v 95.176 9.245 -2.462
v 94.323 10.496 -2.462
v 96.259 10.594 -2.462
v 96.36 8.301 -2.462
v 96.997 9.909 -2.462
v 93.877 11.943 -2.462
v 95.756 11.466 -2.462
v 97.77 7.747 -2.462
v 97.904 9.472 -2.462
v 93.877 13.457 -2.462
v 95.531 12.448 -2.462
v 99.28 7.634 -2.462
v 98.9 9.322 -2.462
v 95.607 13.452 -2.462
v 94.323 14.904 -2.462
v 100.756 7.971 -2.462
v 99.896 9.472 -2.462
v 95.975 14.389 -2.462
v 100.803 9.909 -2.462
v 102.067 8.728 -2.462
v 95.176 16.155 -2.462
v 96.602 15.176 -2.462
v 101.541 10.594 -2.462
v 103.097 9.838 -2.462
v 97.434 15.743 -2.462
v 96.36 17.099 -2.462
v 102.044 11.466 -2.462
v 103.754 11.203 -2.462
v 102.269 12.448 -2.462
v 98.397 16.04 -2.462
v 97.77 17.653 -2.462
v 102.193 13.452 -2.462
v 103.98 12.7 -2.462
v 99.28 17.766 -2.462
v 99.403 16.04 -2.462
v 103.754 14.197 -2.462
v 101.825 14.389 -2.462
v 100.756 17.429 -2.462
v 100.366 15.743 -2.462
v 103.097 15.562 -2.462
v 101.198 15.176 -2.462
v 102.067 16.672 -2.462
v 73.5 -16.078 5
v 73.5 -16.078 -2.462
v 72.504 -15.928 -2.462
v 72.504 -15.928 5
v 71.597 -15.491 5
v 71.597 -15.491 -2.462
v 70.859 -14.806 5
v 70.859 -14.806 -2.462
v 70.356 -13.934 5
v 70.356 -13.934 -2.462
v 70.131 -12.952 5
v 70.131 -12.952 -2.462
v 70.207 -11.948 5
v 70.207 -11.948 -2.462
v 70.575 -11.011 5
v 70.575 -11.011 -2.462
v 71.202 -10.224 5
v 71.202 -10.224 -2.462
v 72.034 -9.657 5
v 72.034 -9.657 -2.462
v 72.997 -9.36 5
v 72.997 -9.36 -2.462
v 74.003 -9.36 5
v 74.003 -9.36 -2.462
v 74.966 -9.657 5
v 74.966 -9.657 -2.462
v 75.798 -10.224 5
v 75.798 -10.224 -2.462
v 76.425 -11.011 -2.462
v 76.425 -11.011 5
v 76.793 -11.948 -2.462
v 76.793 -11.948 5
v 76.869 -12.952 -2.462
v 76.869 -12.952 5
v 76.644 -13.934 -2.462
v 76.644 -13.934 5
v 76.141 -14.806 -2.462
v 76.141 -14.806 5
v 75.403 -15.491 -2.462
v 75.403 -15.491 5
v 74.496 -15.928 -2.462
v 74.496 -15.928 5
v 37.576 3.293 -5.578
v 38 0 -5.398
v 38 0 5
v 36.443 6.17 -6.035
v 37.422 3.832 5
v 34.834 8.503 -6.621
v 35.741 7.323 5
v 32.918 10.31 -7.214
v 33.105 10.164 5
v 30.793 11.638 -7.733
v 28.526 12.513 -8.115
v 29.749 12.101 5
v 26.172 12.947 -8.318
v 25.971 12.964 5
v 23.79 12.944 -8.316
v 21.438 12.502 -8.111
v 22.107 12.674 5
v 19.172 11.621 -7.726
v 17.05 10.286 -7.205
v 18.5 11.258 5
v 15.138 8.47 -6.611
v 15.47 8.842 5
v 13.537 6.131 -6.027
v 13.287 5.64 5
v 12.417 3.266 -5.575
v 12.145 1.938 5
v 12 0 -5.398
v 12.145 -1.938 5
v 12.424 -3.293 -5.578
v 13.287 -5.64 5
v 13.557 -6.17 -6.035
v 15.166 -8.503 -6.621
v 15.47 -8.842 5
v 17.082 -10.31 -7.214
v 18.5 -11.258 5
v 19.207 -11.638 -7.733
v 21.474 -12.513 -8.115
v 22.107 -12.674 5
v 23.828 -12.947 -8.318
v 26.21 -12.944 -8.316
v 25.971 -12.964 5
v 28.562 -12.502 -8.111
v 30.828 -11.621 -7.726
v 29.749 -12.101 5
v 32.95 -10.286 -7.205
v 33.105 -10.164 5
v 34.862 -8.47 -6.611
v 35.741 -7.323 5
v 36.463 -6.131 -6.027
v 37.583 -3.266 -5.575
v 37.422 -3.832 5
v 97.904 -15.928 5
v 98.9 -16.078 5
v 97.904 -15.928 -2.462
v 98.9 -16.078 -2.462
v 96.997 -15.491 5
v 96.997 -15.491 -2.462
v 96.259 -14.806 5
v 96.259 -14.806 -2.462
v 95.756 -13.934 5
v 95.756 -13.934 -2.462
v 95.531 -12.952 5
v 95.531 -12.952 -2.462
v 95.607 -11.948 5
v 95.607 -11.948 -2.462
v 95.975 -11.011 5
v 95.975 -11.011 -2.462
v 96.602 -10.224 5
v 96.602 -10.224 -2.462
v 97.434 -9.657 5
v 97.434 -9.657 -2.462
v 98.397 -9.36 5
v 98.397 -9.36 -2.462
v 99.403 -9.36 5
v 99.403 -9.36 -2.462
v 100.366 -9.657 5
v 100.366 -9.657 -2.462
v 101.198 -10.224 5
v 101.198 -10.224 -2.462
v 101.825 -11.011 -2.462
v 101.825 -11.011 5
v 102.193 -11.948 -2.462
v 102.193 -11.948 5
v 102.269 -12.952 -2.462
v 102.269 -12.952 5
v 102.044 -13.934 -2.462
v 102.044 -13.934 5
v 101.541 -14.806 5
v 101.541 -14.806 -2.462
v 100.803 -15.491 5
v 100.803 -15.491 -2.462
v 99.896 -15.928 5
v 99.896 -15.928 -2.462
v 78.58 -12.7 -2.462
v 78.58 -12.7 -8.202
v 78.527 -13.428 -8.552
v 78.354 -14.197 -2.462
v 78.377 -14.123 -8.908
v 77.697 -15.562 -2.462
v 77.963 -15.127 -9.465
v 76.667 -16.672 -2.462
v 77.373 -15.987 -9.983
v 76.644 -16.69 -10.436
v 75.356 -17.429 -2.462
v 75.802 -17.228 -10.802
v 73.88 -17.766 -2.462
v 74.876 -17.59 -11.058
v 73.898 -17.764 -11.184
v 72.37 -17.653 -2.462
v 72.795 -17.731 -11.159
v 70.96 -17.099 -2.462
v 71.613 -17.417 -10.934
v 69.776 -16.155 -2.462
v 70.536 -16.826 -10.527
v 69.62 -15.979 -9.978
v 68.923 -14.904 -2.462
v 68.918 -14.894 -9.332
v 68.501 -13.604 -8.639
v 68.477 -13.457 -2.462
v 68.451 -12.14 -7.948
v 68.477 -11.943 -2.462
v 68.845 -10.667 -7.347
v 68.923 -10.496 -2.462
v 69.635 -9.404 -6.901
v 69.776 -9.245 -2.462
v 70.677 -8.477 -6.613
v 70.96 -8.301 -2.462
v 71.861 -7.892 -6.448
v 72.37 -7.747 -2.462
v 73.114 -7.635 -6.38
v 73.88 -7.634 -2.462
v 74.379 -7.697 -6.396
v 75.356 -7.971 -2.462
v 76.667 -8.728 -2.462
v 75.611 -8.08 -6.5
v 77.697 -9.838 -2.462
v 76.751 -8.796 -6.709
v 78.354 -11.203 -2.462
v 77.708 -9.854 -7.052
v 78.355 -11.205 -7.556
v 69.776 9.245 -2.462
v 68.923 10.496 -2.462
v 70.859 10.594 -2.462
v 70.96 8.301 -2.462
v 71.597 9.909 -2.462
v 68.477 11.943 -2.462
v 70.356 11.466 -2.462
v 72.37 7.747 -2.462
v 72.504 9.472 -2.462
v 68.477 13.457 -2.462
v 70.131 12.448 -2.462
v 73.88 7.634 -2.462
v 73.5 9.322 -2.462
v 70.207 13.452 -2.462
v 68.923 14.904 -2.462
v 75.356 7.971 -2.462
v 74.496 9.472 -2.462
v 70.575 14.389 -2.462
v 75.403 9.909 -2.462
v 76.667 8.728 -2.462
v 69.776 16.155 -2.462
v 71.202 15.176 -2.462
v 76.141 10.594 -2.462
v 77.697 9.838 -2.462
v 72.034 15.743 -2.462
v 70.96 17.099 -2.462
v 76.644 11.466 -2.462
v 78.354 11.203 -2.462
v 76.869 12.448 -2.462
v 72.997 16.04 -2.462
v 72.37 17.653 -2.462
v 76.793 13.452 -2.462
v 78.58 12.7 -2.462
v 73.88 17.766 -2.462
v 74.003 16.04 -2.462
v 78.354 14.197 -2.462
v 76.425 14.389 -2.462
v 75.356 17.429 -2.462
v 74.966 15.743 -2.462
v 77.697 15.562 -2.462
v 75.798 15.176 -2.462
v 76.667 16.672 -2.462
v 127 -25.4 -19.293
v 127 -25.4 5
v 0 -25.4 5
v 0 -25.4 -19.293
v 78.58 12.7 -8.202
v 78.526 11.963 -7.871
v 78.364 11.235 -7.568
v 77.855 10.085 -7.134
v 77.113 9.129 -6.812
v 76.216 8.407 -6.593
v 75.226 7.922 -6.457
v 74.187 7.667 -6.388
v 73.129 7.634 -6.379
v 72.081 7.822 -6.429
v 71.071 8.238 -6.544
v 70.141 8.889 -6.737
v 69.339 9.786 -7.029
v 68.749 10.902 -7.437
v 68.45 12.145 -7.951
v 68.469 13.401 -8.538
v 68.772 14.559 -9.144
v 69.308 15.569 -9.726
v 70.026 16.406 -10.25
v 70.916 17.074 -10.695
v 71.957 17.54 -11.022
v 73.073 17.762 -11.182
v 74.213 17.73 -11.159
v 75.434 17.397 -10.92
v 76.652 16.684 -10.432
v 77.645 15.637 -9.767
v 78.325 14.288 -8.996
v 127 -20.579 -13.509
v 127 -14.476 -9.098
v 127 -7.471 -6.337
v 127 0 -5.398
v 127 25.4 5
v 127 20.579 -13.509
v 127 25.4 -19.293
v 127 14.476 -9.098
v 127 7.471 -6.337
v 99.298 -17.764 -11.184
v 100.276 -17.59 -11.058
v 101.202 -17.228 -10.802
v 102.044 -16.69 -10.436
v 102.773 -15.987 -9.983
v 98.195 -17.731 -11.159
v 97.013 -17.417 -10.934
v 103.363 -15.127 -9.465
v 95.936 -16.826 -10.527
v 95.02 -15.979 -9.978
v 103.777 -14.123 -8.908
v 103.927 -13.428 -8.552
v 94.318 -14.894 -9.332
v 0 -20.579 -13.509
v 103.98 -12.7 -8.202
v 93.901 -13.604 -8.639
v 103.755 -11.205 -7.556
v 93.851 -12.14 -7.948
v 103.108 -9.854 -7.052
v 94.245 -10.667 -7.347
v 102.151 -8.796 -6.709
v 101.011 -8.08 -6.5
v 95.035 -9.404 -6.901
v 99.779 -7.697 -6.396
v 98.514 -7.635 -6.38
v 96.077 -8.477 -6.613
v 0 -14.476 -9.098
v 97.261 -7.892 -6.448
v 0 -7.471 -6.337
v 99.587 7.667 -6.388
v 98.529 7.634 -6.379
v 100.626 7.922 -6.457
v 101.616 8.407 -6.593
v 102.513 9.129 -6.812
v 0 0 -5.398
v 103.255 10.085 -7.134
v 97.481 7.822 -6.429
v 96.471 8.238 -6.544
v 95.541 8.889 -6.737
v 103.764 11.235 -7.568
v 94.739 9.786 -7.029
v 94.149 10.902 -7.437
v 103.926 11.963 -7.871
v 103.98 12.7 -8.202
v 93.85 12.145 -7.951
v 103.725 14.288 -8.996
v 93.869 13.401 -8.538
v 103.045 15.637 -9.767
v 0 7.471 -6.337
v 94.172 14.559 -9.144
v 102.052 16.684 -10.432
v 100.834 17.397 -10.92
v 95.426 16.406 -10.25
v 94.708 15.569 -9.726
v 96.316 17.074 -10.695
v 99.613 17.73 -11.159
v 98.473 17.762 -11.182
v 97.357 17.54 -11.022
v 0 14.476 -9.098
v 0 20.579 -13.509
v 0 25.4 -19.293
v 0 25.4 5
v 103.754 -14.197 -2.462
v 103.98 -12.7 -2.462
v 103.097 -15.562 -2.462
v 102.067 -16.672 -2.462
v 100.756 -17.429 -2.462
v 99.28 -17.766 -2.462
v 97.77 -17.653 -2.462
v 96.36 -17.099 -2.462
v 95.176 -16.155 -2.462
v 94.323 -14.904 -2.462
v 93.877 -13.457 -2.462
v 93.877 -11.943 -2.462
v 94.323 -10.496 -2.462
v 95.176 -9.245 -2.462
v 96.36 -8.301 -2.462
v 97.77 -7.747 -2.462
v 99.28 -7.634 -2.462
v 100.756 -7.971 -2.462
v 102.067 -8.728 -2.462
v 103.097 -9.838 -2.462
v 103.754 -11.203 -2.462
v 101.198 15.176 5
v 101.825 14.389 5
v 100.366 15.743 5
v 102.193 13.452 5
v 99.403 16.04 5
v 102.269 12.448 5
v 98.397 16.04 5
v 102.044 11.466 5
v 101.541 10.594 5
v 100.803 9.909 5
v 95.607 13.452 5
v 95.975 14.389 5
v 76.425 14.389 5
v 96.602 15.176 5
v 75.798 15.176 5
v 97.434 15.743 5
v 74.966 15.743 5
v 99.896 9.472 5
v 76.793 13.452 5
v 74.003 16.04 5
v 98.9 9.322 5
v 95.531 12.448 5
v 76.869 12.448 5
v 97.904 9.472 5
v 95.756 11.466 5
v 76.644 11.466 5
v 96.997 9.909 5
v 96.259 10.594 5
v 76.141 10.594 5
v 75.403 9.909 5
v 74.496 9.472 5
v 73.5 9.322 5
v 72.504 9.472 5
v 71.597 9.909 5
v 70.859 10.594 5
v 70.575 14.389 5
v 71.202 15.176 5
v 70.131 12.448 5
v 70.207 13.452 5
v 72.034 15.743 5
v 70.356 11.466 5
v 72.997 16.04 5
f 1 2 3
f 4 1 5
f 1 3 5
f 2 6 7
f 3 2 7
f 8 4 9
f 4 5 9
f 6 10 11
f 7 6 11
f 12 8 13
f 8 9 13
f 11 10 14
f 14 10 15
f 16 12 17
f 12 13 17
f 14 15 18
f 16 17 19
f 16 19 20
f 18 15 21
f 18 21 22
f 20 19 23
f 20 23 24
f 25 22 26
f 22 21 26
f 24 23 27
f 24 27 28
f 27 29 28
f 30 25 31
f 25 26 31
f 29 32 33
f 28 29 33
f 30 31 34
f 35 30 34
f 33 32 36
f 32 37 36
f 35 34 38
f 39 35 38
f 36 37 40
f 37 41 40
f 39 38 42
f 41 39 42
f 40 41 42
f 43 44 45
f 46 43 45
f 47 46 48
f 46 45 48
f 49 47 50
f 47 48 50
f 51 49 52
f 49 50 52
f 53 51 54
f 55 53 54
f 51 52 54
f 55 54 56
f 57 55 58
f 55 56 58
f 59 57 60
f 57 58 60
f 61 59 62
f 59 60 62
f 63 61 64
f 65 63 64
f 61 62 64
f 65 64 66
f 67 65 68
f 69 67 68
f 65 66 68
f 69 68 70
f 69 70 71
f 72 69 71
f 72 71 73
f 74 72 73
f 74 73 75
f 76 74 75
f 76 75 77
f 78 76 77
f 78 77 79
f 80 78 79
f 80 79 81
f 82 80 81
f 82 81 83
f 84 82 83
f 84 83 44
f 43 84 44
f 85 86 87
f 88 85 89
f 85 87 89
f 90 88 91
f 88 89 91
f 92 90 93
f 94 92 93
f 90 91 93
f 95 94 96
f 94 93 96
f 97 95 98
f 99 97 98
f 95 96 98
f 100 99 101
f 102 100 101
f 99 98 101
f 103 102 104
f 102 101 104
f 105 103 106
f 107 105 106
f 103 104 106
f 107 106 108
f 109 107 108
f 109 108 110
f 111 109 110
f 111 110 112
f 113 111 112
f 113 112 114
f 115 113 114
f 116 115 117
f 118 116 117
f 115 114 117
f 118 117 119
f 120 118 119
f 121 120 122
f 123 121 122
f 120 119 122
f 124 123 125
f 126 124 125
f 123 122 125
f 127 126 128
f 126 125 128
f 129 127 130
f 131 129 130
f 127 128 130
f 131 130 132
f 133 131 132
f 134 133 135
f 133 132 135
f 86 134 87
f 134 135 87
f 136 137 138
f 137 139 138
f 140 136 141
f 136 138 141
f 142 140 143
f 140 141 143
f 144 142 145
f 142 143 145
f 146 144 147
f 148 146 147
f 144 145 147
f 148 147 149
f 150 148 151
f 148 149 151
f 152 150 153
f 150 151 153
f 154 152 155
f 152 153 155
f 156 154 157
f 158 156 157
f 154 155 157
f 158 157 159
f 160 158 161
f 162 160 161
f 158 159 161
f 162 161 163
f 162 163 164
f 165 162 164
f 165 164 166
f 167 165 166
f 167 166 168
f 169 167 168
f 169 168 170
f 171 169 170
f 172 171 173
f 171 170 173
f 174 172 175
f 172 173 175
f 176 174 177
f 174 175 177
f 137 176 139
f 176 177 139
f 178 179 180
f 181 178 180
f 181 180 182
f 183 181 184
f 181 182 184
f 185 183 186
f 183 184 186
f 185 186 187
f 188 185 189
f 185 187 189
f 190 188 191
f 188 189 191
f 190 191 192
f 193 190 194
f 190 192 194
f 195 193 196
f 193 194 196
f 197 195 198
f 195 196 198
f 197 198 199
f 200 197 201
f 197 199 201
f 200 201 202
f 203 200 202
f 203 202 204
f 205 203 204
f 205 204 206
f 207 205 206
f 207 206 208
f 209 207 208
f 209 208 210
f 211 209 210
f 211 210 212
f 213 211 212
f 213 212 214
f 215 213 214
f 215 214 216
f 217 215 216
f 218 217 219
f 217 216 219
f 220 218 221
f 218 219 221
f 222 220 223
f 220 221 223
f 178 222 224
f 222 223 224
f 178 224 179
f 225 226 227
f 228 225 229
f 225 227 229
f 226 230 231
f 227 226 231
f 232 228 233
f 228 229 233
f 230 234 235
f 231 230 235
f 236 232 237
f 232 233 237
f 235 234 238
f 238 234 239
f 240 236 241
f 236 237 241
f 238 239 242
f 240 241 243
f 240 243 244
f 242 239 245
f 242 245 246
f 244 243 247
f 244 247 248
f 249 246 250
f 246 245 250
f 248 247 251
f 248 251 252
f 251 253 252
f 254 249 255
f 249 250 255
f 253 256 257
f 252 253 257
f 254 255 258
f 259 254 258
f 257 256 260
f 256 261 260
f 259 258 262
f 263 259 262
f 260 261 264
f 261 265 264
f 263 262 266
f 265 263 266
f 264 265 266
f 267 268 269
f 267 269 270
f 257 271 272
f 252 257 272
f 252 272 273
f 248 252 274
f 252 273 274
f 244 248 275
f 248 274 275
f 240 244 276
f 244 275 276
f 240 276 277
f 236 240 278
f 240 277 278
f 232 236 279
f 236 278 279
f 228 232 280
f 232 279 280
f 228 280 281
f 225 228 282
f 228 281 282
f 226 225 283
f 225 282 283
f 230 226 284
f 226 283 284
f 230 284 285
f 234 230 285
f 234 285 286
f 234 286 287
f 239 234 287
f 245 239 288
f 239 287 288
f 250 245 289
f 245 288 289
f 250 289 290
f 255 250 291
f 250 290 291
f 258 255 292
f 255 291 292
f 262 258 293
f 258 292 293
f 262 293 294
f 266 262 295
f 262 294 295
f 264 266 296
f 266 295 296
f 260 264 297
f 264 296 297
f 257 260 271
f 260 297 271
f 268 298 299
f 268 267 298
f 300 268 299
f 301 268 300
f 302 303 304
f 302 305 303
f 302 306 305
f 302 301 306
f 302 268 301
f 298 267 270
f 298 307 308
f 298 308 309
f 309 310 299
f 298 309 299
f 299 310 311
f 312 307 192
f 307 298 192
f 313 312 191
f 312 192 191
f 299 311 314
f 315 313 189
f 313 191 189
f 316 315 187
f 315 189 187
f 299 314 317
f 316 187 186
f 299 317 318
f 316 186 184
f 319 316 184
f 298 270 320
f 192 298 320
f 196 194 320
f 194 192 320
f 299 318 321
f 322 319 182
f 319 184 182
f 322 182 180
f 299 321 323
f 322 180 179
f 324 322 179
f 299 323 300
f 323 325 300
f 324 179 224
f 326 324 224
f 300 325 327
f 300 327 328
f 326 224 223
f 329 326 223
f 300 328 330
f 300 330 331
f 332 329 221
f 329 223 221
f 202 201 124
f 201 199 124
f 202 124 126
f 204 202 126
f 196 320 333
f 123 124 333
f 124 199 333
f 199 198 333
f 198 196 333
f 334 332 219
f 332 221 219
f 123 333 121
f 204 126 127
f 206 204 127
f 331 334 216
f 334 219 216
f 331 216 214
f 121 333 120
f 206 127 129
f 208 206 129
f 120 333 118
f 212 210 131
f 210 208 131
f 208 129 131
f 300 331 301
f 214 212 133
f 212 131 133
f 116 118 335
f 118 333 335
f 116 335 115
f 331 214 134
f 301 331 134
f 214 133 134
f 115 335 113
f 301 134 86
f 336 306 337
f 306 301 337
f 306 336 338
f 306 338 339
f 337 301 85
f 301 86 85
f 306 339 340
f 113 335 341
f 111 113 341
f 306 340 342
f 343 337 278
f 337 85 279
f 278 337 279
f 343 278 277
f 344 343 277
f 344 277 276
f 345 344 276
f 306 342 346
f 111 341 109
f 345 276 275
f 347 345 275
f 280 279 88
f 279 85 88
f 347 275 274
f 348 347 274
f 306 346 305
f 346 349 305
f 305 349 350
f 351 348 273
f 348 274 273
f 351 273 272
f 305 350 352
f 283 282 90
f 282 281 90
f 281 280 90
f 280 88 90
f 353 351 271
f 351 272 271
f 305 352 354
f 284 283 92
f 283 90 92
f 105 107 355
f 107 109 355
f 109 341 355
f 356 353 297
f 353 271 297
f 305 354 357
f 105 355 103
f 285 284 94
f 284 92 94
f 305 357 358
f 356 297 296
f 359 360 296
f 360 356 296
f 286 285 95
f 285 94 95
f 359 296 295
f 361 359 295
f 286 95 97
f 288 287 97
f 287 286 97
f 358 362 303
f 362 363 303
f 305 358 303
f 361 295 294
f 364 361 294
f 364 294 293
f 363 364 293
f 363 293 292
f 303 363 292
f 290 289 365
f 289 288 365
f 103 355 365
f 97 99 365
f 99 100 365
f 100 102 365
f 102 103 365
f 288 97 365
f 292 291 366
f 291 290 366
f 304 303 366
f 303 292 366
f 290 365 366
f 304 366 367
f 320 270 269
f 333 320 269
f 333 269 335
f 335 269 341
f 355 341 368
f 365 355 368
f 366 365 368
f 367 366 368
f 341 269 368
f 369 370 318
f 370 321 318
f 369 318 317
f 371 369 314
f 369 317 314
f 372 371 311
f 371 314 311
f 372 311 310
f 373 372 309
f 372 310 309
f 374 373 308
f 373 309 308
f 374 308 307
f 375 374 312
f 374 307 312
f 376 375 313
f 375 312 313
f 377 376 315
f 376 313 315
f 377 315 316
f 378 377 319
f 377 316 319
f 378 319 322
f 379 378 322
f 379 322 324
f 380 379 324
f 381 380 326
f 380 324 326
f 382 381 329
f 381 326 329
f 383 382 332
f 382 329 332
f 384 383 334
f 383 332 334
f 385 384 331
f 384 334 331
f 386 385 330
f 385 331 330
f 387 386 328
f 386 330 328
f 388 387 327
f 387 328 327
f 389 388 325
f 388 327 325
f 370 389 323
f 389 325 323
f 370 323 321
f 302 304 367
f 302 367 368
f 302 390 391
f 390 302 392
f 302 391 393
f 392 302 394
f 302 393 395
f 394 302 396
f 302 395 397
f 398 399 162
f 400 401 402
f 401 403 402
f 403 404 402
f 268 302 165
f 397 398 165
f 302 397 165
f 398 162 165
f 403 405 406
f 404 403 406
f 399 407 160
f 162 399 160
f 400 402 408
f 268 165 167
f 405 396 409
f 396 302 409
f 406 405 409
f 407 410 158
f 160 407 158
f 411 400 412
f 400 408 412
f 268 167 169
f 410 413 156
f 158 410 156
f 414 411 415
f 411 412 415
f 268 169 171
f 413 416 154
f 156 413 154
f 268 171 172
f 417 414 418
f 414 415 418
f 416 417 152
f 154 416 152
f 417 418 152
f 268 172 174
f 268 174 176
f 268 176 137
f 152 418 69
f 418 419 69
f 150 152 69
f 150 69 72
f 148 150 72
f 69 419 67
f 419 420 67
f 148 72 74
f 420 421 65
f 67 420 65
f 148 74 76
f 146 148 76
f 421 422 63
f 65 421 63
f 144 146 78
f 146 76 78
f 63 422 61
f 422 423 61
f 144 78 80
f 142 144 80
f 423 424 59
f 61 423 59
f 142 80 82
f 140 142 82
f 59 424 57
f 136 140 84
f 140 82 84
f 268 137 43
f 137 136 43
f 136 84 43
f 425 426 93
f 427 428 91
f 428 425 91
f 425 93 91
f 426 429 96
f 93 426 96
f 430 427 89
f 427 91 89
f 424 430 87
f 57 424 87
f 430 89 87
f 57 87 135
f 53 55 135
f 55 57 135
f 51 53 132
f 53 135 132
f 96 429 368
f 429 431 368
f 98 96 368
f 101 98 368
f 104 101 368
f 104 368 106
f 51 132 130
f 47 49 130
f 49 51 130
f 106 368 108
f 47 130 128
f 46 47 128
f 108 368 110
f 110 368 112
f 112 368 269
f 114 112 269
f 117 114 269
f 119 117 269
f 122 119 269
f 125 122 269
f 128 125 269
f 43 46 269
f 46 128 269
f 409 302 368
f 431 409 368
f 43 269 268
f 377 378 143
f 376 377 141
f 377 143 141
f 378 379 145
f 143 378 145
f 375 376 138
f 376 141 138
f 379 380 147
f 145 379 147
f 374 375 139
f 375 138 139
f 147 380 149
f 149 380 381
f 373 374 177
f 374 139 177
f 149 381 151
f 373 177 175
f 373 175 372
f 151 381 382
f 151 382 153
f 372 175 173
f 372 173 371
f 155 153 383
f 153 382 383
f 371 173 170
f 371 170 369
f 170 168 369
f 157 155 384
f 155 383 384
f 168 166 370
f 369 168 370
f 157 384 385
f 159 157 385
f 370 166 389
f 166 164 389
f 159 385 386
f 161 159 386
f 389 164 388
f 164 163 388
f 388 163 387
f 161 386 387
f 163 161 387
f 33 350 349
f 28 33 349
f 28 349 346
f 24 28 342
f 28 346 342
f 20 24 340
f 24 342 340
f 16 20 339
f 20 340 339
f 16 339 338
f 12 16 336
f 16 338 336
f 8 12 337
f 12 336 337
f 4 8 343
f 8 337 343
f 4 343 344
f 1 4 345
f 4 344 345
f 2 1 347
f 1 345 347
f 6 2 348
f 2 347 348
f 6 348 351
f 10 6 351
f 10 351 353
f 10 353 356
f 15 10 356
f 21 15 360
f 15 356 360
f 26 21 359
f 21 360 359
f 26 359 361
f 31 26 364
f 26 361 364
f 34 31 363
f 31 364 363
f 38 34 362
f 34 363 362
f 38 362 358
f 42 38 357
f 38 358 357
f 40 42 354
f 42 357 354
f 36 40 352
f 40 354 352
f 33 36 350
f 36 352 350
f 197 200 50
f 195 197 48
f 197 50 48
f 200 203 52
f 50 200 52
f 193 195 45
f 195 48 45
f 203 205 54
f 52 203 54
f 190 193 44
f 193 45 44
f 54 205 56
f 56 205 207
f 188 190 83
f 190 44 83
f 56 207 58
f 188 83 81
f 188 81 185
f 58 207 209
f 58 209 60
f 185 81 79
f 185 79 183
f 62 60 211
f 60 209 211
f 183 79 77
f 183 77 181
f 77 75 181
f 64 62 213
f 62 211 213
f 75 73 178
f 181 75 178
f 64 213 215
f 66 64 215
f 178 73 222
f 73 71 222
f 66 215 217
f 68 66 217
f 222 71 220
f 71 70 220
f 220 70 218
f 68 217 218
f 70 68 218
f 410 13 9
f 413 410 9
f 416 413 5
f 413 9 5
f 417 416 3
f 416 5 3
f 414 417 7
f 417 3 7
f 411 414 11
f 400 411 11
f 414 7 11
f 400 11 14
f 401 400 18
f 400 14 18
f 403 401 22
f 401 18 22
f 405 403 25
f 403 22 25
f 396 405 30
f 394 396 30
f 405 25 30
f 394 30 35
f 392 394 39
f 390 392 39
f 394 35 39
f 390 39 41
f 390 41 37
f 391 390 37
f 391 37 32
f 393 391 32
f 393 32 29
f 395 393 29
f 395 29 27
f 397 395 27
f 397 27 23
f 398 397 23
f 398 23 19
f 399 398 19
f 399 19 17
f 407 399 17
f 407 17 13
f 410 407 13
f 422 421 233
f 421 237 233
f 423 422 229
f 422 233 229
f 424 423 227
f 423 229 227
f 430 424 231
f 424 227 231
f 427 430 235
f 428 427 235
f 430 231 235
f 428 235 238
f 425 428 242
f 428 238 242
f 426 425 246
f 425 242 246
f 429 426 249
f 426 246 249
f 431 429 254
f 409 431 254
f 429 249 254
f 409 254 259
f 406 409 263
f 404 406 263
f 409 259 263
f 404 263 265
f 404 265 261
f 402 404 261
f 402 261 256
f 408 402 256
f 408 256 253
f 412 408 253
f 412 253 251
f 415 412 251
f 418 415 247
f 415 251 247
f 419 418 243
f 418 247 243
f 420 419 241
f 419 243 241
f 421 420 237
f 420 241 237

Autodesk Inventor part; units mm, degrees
ref_plane "YZ Plane" through (0, 0, 0) normal (1, 0, 0) x (0, 1, 0)
ref_plane "XZ Plane" through (0, 0, 0) normal (0, 1, 0) x (-1, 0, 0)
sketch "Sketch1" plane through (0, 0, 0) normal (1, 0, 0) x (0, 1, 0)
  arc A0 (25.4, -19.293) -> (-25.4, -19.293) centre (0, -35.56) ccw
  line L0 (0, 0) -> (0, -134.2841)
  line L1 (-25.4, 0) -> (-25.4, -19.293)
  line L2 (25.4, -19.293) -> (25.4, 0)
  line L3 (25.4, 0) -> (25.4, 5)
  line L4 (25.4, 5) -> (-25.4, 5)
  line L5 (-25.4, 5) -> (-25.4, 0)
  dimension "d0" = 60.325
  dimension "d3" = 50.8
  dimension "d38" = 5
extrude "Extrusion1" add sketch "Sketch1" along normal blind 127
sketch "Sketch4" plane through (0, 25.4, 5) normal (0, 0, 1) x (1, 0, 0)
  circle A0 centre (25, -25.4) radius 13
  line L0 (0, 0) -> (127, 0) projected
  line L1 (0, 0) -> (0, -50.8) projected
  dimension "d20" = 26
  dimension "d39" = 25.4
  dimension "d40" = 25
extrude "Extrusion4" cut sketch "Sketch4" against normal through all
sketch "Sketch6" plane through (0, -25.4, 5) normal (0, 0, 1) x (1, 0, 0)
  line L0 (73.5, 38.1) -> (98.9, 38.1)
  line L1 (98.9, 38.1) -> (98.9, 12.7)
  line L2 (98.9, 12.7) -> (73.5, 12.7)
  line L3 (73.5, 12.7) -> (73.5, 38.1)
  line L4 (0, 0) -> (127, 0) construction
  line L5 (0, 50.8) -> (127, 50.8) projected
  line L6 (0, 50.8) -> (0, 0) projected
  point P0 (0, 25.4)
  point P1 (73.5, 25.4)
  dimension "d35" = 25.4
  dimension "d36" = 25.4
  dimension "d41" = 25.4
  dimension "d42" = 73.5
hole "Hole1" at (73.5, 12.7, 5) at (98.9, 12.7, 5) at (98.9, -12.7, 5) at (73.5, -12.7, 5) direction (0, 0, -1) diameter 6.756 end through all clearance for "Socket Head Cap Screw" size "1/4" standard "Ansi Unified Screw Threads"
ref_plane "Work Plane1" through (0, -25.4, -12.4625) normal (0, 0, 1) x (1, 0, 0)
sketch "Sketch7" plane through (0, -25.4, -12.4625) normal (0, 0, 1) x (1, 0, 0)
  circle A0 centre (73.5, 38.1) radius 3.378 projected
  circle A1 centre (73.5, 38.1) radius 5.08
  circle A2 centre (73.5, 12.7) radius 3.378 projected
  circle A3 centre (73.5, 12.7) radius 5.08
  circle A4 centre (98.9, 12.7) radius 3.378 projected
  circle A5 centre (98.9, 12.7) radius 5.08
  circle A6 centre (98.9, 38.1) radius 3.378 projected
  circle A7 centre (98.9, 38.1) radius 5.08
  point P0 (0, 25.4)
  dimension "d44" = 10.16
extrude "Extrusion5" cut sketch "Sketch7" along normal blind 10 contours A0 | A1 | A2 | A3 | A4 | A5 | A6 | A7
properties part number "Motor Mount" material "ABS Plastic"
